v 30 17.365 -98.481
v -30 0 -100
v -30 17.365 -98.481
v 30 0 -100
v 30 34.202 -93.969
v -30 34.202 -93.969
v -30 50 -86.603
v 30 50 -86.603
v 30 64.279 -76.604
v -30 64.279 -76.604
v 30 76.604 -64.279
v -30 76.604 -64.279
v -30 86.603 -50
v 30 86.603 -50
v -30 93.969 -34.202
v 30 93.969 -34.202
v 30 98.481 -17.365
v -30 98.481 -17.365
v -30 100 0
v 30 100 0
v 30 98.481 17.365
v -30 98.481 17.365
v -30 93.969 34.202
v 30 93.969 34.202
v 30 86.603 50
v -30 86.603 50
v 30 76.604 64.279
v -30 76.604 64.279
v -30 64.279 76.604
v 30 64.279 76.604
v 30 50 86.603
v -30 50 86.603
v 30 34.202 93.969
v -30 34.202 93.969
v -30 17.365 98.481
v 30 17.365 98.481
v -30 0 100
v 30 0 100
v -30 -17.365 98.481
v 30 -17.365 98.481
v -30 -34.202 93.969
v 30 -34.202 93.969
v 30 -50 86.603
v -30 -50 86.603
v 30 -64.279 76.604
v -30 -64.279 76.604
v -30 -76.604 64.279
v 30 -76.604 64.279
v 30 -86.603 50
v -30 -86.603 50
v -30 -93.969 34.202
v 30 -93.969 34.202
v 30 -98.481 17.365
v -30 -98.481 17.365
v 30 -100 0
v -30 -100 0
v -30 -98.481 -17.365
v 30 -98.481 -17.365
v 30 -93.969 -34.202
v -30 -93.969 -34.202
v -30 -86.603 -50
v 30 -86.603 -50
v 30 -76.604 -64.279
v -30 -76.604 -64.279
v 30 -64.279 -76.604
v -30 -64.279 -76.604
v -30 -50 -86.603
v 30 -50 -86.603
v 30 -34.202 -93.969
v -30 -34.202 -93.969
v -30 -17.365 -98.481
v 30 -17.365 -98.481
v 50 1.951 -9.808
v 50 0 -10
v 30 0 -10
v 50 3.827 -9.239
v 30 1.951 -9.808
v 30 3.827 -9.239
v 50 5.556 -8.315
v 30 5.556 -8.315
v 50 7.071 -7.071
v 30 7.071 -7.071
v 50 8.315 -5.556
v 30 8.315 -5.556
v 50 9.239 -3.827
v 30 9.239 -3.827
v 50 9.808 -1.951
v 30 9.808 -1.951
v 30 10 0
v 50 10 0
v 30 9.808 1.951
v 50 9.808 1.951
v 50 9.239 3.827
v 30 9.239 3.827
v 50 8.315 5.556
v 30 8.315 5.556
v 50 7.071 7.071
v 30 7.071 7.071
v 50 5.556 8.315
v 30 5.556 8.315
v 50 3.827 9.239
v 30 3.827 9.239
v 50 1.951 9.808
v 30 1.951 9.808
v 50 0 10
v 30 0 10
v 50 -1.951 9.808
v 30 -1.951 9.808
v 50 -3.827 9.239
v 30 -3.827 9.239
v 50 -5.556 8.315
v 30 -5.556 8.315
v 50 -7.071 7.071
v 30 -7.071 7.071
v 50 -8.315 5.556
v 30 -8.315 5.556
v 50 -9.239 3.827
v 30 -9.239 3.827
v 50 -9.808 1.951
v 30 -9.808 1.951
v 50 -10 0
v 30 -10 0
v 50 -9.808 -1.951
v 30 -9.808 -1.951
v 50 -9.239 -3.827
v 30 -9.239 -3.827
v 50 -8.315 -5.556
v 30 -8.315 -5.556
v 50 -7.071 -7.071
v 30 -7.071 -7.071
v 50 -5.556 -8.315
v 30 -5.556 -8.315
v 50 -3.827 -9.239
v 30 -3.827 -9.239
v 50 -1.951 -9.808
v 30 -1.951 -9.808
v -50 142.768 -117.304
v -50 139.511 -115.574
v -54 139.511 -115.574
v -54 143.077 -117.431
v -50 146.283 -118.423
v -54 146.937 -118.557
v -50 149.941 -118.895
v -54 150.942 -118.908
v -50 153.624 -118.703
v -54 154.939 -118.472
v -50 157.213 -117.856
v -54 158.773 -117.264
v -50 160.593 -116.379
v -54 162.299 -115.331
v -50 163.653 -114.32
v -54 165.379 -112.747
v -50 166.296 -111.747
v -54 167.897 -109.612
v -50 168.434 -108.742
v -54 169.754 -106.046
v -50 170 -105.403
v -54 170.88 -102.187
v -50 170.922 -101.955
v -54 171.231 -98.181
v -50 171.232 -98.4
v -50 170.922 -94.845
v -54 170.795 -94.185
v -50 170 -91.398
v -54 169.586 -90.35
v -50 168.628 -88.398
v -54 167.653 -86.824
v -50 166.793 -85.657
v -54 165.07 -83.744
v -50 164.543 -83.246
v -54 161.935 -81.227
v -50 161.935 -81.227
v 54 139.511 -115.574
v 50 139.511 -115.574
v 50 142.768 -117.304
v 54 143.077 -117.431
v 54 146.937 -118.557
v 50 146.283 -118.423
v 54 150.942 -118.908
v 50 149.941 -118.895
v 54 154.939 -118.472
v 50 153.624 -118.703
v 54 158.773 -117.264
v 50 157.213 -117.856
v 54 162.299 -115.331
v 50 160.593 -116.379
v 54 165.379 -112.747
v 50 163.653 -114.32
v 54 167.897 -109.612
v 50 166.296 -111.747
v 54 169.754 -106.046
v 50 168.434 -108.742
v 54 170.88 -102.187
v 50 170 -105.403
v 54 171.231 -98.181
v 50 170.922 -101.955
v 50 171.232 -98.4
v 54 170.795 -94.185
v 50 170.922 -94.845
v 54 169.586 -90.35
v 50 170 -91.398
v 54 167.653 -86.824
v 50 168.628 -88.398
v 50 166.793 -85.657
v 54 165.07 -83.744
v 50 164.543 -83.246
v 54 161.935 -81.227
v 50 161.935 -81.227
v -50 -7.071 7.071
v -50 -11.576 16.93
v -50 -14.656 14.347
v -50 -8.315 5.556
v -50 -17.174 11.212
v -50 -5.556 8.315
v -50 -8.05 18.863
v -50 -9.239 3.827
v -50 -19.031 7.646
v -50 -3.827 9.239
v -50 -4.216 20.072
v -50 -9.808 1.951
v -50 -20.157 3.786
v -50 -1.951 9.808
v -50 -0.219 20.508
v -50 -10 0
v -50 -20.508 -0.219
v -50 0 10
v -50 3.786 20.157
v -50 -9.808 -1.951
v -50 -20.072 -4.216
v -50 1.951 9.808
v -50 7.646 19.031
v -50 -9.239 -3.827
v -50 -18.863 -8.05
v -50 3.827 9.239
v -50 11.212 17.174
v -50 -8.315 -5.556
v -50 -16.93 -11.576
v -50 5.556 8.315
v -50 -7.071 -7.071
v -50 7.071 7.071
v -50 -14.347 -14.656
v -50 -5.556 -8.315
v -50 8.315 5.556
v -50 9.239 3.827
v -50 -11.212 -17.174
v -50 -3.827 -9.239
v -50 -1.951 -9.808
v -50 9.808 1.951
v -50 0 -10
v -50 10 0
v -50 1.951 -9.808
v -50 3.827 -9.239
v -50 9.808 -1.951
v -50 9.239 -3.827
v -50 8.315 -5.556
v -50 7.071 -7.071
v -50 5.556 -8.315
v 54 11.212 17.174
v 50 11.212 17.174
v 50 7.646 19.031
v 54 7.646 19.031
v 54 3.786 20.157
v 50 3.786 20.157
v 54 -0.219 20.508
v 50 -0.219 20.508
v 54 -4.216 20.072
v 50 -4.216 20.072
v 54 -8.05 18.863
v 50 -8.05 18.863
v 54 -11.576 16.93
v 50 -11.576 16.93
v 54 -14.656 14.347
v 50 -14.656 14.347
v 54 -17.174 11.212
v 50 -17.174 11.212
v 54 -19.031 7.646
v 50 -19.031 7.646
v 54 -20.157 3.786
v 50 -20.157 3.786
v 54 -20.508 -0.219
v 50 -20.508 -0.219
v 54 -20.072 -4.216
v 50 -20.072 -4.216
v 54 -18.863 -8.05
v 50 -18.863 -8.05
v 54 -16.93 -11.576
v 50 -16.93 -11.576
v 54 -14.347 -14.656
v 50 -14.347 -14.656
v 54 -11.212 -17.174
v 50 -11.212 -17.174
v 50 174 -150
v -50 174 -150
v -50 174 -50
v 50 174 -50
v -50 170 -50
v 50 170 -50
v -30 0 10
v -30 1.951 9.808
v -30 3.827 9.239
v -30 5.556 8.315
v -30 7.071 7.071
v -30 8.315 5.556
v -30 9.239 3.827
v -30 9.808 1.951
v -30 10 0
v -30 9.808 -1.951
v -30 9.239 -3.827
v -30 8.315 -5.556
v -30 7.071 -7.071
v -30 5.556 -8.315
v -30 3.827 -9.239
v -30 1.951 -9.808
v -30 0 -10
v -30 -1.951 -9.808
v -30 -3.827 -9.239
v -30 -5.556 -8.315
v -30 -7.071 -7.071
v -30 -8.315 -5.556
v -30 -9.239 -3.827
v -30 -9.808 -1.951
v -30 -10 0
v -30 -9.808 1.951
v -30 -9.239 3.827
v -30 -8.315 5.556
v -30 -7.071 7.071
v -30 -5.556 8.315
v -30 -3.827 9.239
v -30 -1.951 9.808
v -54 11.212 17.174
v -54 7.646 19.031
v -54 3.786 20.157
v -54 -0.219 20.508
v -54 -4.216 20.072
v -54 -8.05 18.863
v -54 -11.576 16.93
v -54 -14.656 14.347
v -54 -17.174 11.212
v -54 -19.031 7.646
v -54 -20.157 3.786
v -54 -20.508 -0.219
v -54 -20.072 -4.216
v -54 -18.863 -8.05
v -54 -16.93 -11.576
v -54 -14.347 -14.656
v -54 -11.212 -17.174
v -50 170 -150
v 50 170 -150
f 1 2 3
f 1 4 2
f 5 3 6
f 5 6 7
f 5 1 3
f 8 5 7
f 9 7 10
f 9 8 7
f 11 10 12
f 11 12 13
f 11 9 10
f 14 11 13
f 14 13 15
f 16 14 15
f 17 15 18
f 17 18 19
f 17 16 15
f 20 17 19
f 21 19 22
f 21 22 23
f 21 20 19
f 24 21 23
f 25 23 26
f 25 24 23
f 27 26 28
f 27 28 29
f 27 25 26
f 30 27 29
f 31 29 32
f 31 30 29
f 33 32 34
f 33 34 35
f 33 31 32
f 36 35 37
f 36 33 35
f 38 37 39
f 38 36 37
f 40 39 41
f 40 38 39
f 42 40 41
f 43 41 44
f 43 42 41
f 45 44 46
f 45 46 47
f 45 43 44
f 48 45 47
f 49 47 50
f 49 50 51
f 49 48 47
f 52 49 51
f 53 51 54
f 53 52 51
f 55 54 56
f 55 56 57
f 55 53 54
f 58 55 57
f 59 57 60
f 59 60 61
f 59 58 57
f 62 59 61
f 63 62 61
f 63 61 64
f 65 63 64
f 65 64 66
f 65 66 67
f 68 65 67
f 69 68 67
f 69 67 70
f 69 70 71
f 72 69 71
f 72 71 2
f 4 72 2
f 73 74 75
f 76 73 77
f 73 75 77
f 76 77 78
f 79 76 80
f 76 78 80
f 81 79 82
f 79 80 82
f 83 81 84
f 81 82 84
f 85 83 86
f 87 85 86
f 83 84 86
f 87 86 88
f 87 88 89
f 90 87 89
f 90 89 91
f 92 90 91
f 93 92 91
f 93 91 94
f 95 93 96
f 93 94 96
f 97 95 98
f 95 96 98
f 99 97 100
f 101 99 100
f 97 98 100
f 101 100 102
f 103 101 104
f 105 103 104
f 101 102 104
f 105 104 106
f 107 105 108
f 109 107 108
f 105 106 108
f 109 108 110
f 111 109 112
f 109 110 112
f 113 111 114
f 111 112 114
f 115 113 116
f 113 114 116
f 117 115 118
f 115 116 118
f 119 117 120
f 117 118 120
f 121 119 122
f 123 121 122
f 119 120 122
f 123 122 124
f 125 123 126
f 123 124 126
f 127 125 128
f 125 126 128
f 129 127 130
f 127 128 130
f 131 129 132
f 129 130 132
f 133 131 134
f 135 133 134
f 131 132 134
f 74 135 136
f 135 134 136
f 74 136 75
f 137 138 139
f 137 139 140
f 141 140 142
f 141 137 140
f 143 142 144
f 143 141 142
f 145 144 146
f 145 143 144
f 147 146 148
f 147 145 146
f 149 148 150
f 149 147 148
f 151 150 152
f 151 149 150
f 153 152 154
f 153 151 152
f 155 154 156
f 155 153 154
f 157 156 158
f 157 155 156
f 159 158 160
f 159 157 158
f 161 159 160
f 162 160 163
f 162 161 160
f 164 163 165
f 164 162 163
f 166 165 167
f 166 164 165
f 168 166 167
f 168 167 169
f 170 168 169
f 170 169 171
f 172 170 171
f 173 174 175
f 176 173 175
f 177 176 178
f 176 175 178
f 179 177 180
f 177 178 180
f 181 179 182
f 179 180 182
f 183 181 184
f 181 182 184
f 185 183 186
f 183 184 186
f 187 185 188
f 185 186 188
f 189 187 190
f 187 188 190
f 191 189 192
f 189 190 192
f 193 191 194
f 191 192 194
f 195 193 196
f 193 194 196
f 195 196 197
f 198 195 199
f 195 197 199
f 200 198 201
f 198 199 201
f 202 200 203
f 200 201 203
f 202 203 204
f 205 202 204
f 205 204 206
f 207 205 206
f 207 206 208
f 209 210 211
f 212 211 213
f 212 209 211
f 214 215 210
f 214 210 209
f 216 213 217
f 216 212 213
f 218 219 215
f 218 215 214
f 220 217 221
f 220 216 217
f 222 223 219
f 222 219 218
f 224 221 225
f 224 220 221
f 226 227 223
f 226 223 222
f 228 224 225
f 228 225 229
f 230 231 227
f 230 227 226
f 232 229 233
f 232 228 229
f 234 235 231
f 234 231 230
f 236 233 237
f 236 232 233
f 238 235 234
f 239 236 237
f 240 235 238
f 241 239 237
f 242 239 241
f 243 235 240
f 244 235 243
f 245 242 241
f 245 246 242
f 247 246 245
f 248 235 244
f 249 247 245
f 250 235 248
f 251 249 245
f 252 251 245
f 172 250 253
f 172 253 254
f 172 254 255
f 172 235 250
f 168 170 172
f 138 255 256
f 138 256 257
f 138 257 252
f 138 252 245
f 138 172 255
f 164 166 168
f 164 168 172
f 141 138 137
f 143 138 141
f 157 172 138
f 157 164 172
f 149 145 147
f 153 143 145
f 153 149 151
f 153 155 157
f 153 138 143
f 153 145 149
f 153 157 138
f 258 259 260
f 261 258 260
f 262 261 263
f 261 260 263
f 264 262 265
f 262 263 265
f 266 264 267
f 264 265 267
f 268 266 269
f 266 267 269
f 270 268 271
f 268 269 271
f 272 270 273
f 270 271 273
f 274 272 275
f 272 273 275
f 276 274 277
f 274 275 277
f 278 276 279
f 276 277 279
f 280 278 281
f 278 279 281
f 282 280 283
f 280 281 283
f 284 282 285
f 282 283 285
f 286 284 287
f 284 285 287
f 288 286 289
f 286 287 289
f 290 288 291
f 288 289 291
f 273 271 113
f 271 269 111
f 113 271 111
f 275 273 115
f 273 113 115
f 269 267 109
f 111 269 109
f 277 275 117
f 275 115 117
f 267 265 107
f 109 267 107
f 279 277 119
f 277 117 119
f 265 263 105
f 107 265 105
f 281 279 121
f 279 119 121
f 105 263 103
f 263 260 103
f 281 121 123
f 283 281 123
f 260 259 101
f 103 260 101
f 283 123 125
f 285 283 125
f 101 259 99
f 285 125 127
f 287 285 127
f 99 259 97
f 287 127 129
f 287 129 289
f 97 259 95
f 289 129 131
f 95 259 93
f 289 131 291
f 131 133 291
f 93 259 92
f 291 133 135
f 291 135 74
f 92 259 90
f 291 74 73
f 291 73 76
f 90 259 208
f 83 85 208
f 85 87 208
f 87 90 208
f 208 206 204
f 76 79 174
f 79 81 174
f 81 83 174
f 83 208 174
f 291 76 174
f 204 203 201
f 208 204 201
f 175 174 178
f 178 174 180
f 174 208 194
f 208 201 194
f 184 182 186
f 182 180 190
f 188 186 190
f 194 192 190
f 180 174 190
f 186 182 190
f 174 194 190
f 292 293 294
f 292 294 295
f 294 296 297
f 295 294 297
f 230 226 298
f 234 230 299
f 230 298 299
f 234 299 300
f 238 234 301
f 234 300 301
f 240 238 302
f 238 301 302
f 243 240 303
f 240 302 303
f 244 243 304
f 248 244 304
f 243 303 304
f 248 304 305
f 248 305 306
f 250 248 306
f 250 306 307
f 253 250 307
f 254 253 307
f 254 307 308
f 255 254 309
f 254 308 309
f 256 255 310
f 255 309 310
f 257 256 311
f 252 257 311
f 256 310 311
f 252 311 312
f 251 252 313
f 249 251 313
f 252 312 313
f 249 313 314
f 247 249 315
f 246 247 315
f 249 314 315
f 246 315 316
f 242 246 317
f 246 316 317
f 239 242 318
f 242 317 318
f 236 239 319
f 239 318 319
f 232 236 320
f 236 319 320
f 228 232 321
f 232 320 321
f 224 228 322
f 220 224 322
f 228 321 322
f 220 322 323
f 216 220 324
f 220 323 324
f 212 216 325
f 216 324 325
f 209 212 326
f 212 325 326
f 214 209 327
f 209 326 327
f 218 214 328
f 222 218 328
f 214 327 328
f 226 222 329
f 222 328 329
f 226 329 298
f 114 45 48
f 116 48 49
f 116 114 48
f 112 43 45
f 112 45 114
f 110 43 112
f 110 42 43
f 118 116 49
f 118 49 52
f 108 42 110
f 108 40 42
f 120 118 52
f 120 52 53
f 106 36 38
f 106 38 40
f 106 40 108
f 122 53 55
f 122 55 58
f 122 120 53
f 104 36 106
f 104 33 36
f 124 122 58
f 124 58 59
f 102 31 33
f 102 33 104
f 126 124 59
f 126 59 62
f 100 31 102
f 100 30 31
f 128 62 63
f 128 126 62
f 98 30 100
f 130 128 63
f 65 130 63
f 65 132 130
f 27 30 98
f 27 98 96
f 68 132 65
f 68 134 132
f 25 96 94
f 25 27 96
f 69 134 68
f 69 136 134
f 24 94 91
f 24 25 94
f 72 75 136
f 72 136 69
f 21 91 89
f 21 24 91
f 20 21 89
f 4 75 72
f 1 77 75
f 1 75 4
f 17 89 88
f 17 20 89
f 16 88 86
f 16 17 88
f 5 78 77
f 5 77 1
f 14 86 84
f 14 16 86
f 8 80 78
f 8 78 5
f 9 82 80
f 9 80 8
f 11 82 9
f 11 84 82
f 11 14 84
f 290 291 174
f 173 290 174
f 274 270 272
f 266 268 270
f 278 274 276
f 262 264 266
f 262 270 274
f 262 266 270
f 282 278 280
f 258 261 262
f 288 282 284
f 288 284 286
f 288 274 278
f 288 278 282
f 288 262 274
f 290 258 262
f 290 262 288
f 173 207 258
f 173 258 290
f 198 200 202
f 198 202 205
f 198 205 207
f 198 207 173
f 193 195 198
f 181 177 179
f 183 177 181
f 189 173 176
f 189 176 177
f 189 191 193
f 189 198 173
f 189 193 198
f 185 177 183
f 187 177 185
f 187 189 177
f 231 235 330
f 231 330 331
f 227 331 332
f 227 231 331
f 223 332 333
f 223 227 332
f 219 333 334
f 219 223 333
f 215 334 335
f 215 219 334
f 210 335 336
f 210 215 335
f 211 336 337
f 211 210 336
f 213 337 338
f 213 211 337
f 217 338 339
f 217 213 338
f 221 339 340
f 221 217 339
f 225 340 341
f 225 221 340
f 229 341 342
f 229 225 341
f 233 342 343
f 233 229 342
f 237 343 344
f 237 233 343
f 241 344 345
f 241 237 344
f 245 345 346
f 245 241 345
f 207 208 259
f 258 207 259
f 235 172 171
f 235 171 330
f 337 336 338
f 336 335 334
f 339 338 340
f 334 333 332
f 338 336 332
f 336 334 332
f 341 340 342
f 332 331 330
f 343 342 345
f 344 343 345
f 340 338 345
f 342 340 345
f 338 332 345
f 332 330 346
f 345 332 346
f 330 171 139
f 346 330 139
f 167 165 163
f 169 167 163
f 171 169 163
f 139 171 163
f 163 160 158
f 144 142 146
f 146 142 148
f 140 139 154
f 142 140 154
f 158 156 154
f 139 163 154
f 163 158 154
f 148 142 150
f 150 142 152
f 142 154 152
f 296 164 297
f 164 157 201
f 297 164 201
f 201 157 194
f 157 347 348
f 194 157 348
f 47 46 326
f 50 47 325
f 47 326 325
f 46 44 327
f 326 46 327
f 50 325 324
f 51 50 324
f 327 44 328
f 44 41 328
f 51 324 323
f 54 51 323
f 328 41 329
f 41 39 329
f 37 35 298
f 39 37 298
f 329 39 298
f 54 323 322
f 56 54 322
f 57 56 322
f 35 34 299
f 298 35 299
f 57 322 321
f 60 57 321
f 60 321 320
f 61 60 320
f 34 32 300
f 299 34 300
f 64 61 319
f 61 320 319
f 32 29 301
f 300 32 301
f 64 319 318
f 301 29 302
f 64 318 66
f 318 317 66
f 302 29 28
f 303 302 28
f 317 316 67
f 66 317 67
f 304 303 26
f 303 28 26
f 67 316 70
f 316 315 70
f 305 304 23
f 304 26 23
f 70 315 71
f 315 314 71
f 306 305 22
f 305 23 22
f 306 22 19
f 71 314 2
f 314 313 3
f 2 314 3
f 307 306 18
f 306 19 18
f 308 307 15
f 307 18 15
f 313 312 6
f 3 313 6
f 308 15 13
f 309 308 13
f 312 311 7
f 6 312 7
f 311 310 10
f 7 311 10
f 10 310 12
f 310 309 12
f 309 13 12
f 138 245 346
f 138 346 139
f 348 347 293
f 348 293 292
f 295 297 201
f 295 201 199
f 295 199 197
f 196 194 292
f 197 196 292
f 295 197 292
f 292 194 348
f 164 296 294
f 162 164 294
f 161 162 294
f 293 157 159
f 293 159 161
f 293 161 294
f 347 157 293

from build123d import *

# Parameters (mm, degrees)
BOSS_EXTRUDE2_DEPTH      = 30
BOSS_EXTRUDE2_DEPTH_BACK = 30
SKETCH1_R                = 100
SKETCH2_R                = 10
BOSS_EXTRUDE3_DEPTH      = 20
BOSS_EXTRUDE4_START      = 20
SKETCH3_R                = 10
BOSS_EXTRUDE4_DEPTH      = 20
BOSS_EXTRUDE5_DEPTH      = 4
SKETCH10_W               = 100
SKETCH10_H               = 100
BOSS_EXTRUDE6_DEPTH      = 4


with BuildPart() as part:
    # Sketch1 → Boss-Extrude2 (new, two sides: drawn at the far end of the back side and taken through both)
    with BuildSketch(Plane(origin=(0, 0, 0), x_dir=(0, 0, -1), z_dir=(1, 0, 0)).offset(-BOSS_EXTRUDE2_DEPTH_BACK)):
        Circle(SKETCH1_R)
    extrude(amount=BOSS_EXTRUDE2_DEPTH + BOSS_EXTRUDE2_DEPTH_BACK)

    # Sketch2 → Boss-Extrude3 (add)
    with BuildSketch(Plane(origin=(30, 0, 0), x_dir=(0, 0, -1), z_dir=(1, 0, 0))):
        Circle(SKETCH2_R)
    extrude(amount=BOSS_EXTRUDE3_DEPTH)

    # Sketch3 → Boss-Extrude4 (add)
    with BuildSketch(Plane.ZY.offset(30).offset(BOSS_EXTRUDE4_START)):
        Circle(SKETCH3_R)
    extrude(amount=-BOSS_EXTRUDE4_DEPTH)

    # Sketch5 → Boss-Extrude5 (add)
    with BuildSketch(Plane.ZY.offset(50)):
        with BuildLine():
            Line((-17.1736092, -11.211866262), (-115.573756817, 139.51109466))
            ThreePointArc((-115.573756817, 139.51109466), (-109.612013879, 167.896570122), (-81.226538417, 161.934827183))
            Line((-81.226538417, 161.934827183), (17.1736092, 11.211866262))
            ThreePointArc((17.1736092, 11.211866262), (11.211866262, -17.1736092), (-17.1736092, -11.211866262))
        make_face()
    boss_extrude5 = extrude(amount=BOSS_EXTRUDE5_DEPTH)

    # Mirror1: Boss-Extrude5 across plane
    add(boss_extrude5.mirror(Plane(origin=(0, 0, 0), x_dir=(0, 0, 1), z_dir=(1, 0, 0))))

    # Sketch10 → Boss-Extrude6 (add)
    with BuildSketch(Plane(origin=(0, 170, 0), x_dir=(1, 0, 0), z_dir=(0, 1, 0))):
        with Locations((0, 100)):
            Rectangle(SKETCH10_W, SKETCH10_H)
    extrude(amount=BOSS_EXTRUDE6_DEPTH)


solid = part.part
